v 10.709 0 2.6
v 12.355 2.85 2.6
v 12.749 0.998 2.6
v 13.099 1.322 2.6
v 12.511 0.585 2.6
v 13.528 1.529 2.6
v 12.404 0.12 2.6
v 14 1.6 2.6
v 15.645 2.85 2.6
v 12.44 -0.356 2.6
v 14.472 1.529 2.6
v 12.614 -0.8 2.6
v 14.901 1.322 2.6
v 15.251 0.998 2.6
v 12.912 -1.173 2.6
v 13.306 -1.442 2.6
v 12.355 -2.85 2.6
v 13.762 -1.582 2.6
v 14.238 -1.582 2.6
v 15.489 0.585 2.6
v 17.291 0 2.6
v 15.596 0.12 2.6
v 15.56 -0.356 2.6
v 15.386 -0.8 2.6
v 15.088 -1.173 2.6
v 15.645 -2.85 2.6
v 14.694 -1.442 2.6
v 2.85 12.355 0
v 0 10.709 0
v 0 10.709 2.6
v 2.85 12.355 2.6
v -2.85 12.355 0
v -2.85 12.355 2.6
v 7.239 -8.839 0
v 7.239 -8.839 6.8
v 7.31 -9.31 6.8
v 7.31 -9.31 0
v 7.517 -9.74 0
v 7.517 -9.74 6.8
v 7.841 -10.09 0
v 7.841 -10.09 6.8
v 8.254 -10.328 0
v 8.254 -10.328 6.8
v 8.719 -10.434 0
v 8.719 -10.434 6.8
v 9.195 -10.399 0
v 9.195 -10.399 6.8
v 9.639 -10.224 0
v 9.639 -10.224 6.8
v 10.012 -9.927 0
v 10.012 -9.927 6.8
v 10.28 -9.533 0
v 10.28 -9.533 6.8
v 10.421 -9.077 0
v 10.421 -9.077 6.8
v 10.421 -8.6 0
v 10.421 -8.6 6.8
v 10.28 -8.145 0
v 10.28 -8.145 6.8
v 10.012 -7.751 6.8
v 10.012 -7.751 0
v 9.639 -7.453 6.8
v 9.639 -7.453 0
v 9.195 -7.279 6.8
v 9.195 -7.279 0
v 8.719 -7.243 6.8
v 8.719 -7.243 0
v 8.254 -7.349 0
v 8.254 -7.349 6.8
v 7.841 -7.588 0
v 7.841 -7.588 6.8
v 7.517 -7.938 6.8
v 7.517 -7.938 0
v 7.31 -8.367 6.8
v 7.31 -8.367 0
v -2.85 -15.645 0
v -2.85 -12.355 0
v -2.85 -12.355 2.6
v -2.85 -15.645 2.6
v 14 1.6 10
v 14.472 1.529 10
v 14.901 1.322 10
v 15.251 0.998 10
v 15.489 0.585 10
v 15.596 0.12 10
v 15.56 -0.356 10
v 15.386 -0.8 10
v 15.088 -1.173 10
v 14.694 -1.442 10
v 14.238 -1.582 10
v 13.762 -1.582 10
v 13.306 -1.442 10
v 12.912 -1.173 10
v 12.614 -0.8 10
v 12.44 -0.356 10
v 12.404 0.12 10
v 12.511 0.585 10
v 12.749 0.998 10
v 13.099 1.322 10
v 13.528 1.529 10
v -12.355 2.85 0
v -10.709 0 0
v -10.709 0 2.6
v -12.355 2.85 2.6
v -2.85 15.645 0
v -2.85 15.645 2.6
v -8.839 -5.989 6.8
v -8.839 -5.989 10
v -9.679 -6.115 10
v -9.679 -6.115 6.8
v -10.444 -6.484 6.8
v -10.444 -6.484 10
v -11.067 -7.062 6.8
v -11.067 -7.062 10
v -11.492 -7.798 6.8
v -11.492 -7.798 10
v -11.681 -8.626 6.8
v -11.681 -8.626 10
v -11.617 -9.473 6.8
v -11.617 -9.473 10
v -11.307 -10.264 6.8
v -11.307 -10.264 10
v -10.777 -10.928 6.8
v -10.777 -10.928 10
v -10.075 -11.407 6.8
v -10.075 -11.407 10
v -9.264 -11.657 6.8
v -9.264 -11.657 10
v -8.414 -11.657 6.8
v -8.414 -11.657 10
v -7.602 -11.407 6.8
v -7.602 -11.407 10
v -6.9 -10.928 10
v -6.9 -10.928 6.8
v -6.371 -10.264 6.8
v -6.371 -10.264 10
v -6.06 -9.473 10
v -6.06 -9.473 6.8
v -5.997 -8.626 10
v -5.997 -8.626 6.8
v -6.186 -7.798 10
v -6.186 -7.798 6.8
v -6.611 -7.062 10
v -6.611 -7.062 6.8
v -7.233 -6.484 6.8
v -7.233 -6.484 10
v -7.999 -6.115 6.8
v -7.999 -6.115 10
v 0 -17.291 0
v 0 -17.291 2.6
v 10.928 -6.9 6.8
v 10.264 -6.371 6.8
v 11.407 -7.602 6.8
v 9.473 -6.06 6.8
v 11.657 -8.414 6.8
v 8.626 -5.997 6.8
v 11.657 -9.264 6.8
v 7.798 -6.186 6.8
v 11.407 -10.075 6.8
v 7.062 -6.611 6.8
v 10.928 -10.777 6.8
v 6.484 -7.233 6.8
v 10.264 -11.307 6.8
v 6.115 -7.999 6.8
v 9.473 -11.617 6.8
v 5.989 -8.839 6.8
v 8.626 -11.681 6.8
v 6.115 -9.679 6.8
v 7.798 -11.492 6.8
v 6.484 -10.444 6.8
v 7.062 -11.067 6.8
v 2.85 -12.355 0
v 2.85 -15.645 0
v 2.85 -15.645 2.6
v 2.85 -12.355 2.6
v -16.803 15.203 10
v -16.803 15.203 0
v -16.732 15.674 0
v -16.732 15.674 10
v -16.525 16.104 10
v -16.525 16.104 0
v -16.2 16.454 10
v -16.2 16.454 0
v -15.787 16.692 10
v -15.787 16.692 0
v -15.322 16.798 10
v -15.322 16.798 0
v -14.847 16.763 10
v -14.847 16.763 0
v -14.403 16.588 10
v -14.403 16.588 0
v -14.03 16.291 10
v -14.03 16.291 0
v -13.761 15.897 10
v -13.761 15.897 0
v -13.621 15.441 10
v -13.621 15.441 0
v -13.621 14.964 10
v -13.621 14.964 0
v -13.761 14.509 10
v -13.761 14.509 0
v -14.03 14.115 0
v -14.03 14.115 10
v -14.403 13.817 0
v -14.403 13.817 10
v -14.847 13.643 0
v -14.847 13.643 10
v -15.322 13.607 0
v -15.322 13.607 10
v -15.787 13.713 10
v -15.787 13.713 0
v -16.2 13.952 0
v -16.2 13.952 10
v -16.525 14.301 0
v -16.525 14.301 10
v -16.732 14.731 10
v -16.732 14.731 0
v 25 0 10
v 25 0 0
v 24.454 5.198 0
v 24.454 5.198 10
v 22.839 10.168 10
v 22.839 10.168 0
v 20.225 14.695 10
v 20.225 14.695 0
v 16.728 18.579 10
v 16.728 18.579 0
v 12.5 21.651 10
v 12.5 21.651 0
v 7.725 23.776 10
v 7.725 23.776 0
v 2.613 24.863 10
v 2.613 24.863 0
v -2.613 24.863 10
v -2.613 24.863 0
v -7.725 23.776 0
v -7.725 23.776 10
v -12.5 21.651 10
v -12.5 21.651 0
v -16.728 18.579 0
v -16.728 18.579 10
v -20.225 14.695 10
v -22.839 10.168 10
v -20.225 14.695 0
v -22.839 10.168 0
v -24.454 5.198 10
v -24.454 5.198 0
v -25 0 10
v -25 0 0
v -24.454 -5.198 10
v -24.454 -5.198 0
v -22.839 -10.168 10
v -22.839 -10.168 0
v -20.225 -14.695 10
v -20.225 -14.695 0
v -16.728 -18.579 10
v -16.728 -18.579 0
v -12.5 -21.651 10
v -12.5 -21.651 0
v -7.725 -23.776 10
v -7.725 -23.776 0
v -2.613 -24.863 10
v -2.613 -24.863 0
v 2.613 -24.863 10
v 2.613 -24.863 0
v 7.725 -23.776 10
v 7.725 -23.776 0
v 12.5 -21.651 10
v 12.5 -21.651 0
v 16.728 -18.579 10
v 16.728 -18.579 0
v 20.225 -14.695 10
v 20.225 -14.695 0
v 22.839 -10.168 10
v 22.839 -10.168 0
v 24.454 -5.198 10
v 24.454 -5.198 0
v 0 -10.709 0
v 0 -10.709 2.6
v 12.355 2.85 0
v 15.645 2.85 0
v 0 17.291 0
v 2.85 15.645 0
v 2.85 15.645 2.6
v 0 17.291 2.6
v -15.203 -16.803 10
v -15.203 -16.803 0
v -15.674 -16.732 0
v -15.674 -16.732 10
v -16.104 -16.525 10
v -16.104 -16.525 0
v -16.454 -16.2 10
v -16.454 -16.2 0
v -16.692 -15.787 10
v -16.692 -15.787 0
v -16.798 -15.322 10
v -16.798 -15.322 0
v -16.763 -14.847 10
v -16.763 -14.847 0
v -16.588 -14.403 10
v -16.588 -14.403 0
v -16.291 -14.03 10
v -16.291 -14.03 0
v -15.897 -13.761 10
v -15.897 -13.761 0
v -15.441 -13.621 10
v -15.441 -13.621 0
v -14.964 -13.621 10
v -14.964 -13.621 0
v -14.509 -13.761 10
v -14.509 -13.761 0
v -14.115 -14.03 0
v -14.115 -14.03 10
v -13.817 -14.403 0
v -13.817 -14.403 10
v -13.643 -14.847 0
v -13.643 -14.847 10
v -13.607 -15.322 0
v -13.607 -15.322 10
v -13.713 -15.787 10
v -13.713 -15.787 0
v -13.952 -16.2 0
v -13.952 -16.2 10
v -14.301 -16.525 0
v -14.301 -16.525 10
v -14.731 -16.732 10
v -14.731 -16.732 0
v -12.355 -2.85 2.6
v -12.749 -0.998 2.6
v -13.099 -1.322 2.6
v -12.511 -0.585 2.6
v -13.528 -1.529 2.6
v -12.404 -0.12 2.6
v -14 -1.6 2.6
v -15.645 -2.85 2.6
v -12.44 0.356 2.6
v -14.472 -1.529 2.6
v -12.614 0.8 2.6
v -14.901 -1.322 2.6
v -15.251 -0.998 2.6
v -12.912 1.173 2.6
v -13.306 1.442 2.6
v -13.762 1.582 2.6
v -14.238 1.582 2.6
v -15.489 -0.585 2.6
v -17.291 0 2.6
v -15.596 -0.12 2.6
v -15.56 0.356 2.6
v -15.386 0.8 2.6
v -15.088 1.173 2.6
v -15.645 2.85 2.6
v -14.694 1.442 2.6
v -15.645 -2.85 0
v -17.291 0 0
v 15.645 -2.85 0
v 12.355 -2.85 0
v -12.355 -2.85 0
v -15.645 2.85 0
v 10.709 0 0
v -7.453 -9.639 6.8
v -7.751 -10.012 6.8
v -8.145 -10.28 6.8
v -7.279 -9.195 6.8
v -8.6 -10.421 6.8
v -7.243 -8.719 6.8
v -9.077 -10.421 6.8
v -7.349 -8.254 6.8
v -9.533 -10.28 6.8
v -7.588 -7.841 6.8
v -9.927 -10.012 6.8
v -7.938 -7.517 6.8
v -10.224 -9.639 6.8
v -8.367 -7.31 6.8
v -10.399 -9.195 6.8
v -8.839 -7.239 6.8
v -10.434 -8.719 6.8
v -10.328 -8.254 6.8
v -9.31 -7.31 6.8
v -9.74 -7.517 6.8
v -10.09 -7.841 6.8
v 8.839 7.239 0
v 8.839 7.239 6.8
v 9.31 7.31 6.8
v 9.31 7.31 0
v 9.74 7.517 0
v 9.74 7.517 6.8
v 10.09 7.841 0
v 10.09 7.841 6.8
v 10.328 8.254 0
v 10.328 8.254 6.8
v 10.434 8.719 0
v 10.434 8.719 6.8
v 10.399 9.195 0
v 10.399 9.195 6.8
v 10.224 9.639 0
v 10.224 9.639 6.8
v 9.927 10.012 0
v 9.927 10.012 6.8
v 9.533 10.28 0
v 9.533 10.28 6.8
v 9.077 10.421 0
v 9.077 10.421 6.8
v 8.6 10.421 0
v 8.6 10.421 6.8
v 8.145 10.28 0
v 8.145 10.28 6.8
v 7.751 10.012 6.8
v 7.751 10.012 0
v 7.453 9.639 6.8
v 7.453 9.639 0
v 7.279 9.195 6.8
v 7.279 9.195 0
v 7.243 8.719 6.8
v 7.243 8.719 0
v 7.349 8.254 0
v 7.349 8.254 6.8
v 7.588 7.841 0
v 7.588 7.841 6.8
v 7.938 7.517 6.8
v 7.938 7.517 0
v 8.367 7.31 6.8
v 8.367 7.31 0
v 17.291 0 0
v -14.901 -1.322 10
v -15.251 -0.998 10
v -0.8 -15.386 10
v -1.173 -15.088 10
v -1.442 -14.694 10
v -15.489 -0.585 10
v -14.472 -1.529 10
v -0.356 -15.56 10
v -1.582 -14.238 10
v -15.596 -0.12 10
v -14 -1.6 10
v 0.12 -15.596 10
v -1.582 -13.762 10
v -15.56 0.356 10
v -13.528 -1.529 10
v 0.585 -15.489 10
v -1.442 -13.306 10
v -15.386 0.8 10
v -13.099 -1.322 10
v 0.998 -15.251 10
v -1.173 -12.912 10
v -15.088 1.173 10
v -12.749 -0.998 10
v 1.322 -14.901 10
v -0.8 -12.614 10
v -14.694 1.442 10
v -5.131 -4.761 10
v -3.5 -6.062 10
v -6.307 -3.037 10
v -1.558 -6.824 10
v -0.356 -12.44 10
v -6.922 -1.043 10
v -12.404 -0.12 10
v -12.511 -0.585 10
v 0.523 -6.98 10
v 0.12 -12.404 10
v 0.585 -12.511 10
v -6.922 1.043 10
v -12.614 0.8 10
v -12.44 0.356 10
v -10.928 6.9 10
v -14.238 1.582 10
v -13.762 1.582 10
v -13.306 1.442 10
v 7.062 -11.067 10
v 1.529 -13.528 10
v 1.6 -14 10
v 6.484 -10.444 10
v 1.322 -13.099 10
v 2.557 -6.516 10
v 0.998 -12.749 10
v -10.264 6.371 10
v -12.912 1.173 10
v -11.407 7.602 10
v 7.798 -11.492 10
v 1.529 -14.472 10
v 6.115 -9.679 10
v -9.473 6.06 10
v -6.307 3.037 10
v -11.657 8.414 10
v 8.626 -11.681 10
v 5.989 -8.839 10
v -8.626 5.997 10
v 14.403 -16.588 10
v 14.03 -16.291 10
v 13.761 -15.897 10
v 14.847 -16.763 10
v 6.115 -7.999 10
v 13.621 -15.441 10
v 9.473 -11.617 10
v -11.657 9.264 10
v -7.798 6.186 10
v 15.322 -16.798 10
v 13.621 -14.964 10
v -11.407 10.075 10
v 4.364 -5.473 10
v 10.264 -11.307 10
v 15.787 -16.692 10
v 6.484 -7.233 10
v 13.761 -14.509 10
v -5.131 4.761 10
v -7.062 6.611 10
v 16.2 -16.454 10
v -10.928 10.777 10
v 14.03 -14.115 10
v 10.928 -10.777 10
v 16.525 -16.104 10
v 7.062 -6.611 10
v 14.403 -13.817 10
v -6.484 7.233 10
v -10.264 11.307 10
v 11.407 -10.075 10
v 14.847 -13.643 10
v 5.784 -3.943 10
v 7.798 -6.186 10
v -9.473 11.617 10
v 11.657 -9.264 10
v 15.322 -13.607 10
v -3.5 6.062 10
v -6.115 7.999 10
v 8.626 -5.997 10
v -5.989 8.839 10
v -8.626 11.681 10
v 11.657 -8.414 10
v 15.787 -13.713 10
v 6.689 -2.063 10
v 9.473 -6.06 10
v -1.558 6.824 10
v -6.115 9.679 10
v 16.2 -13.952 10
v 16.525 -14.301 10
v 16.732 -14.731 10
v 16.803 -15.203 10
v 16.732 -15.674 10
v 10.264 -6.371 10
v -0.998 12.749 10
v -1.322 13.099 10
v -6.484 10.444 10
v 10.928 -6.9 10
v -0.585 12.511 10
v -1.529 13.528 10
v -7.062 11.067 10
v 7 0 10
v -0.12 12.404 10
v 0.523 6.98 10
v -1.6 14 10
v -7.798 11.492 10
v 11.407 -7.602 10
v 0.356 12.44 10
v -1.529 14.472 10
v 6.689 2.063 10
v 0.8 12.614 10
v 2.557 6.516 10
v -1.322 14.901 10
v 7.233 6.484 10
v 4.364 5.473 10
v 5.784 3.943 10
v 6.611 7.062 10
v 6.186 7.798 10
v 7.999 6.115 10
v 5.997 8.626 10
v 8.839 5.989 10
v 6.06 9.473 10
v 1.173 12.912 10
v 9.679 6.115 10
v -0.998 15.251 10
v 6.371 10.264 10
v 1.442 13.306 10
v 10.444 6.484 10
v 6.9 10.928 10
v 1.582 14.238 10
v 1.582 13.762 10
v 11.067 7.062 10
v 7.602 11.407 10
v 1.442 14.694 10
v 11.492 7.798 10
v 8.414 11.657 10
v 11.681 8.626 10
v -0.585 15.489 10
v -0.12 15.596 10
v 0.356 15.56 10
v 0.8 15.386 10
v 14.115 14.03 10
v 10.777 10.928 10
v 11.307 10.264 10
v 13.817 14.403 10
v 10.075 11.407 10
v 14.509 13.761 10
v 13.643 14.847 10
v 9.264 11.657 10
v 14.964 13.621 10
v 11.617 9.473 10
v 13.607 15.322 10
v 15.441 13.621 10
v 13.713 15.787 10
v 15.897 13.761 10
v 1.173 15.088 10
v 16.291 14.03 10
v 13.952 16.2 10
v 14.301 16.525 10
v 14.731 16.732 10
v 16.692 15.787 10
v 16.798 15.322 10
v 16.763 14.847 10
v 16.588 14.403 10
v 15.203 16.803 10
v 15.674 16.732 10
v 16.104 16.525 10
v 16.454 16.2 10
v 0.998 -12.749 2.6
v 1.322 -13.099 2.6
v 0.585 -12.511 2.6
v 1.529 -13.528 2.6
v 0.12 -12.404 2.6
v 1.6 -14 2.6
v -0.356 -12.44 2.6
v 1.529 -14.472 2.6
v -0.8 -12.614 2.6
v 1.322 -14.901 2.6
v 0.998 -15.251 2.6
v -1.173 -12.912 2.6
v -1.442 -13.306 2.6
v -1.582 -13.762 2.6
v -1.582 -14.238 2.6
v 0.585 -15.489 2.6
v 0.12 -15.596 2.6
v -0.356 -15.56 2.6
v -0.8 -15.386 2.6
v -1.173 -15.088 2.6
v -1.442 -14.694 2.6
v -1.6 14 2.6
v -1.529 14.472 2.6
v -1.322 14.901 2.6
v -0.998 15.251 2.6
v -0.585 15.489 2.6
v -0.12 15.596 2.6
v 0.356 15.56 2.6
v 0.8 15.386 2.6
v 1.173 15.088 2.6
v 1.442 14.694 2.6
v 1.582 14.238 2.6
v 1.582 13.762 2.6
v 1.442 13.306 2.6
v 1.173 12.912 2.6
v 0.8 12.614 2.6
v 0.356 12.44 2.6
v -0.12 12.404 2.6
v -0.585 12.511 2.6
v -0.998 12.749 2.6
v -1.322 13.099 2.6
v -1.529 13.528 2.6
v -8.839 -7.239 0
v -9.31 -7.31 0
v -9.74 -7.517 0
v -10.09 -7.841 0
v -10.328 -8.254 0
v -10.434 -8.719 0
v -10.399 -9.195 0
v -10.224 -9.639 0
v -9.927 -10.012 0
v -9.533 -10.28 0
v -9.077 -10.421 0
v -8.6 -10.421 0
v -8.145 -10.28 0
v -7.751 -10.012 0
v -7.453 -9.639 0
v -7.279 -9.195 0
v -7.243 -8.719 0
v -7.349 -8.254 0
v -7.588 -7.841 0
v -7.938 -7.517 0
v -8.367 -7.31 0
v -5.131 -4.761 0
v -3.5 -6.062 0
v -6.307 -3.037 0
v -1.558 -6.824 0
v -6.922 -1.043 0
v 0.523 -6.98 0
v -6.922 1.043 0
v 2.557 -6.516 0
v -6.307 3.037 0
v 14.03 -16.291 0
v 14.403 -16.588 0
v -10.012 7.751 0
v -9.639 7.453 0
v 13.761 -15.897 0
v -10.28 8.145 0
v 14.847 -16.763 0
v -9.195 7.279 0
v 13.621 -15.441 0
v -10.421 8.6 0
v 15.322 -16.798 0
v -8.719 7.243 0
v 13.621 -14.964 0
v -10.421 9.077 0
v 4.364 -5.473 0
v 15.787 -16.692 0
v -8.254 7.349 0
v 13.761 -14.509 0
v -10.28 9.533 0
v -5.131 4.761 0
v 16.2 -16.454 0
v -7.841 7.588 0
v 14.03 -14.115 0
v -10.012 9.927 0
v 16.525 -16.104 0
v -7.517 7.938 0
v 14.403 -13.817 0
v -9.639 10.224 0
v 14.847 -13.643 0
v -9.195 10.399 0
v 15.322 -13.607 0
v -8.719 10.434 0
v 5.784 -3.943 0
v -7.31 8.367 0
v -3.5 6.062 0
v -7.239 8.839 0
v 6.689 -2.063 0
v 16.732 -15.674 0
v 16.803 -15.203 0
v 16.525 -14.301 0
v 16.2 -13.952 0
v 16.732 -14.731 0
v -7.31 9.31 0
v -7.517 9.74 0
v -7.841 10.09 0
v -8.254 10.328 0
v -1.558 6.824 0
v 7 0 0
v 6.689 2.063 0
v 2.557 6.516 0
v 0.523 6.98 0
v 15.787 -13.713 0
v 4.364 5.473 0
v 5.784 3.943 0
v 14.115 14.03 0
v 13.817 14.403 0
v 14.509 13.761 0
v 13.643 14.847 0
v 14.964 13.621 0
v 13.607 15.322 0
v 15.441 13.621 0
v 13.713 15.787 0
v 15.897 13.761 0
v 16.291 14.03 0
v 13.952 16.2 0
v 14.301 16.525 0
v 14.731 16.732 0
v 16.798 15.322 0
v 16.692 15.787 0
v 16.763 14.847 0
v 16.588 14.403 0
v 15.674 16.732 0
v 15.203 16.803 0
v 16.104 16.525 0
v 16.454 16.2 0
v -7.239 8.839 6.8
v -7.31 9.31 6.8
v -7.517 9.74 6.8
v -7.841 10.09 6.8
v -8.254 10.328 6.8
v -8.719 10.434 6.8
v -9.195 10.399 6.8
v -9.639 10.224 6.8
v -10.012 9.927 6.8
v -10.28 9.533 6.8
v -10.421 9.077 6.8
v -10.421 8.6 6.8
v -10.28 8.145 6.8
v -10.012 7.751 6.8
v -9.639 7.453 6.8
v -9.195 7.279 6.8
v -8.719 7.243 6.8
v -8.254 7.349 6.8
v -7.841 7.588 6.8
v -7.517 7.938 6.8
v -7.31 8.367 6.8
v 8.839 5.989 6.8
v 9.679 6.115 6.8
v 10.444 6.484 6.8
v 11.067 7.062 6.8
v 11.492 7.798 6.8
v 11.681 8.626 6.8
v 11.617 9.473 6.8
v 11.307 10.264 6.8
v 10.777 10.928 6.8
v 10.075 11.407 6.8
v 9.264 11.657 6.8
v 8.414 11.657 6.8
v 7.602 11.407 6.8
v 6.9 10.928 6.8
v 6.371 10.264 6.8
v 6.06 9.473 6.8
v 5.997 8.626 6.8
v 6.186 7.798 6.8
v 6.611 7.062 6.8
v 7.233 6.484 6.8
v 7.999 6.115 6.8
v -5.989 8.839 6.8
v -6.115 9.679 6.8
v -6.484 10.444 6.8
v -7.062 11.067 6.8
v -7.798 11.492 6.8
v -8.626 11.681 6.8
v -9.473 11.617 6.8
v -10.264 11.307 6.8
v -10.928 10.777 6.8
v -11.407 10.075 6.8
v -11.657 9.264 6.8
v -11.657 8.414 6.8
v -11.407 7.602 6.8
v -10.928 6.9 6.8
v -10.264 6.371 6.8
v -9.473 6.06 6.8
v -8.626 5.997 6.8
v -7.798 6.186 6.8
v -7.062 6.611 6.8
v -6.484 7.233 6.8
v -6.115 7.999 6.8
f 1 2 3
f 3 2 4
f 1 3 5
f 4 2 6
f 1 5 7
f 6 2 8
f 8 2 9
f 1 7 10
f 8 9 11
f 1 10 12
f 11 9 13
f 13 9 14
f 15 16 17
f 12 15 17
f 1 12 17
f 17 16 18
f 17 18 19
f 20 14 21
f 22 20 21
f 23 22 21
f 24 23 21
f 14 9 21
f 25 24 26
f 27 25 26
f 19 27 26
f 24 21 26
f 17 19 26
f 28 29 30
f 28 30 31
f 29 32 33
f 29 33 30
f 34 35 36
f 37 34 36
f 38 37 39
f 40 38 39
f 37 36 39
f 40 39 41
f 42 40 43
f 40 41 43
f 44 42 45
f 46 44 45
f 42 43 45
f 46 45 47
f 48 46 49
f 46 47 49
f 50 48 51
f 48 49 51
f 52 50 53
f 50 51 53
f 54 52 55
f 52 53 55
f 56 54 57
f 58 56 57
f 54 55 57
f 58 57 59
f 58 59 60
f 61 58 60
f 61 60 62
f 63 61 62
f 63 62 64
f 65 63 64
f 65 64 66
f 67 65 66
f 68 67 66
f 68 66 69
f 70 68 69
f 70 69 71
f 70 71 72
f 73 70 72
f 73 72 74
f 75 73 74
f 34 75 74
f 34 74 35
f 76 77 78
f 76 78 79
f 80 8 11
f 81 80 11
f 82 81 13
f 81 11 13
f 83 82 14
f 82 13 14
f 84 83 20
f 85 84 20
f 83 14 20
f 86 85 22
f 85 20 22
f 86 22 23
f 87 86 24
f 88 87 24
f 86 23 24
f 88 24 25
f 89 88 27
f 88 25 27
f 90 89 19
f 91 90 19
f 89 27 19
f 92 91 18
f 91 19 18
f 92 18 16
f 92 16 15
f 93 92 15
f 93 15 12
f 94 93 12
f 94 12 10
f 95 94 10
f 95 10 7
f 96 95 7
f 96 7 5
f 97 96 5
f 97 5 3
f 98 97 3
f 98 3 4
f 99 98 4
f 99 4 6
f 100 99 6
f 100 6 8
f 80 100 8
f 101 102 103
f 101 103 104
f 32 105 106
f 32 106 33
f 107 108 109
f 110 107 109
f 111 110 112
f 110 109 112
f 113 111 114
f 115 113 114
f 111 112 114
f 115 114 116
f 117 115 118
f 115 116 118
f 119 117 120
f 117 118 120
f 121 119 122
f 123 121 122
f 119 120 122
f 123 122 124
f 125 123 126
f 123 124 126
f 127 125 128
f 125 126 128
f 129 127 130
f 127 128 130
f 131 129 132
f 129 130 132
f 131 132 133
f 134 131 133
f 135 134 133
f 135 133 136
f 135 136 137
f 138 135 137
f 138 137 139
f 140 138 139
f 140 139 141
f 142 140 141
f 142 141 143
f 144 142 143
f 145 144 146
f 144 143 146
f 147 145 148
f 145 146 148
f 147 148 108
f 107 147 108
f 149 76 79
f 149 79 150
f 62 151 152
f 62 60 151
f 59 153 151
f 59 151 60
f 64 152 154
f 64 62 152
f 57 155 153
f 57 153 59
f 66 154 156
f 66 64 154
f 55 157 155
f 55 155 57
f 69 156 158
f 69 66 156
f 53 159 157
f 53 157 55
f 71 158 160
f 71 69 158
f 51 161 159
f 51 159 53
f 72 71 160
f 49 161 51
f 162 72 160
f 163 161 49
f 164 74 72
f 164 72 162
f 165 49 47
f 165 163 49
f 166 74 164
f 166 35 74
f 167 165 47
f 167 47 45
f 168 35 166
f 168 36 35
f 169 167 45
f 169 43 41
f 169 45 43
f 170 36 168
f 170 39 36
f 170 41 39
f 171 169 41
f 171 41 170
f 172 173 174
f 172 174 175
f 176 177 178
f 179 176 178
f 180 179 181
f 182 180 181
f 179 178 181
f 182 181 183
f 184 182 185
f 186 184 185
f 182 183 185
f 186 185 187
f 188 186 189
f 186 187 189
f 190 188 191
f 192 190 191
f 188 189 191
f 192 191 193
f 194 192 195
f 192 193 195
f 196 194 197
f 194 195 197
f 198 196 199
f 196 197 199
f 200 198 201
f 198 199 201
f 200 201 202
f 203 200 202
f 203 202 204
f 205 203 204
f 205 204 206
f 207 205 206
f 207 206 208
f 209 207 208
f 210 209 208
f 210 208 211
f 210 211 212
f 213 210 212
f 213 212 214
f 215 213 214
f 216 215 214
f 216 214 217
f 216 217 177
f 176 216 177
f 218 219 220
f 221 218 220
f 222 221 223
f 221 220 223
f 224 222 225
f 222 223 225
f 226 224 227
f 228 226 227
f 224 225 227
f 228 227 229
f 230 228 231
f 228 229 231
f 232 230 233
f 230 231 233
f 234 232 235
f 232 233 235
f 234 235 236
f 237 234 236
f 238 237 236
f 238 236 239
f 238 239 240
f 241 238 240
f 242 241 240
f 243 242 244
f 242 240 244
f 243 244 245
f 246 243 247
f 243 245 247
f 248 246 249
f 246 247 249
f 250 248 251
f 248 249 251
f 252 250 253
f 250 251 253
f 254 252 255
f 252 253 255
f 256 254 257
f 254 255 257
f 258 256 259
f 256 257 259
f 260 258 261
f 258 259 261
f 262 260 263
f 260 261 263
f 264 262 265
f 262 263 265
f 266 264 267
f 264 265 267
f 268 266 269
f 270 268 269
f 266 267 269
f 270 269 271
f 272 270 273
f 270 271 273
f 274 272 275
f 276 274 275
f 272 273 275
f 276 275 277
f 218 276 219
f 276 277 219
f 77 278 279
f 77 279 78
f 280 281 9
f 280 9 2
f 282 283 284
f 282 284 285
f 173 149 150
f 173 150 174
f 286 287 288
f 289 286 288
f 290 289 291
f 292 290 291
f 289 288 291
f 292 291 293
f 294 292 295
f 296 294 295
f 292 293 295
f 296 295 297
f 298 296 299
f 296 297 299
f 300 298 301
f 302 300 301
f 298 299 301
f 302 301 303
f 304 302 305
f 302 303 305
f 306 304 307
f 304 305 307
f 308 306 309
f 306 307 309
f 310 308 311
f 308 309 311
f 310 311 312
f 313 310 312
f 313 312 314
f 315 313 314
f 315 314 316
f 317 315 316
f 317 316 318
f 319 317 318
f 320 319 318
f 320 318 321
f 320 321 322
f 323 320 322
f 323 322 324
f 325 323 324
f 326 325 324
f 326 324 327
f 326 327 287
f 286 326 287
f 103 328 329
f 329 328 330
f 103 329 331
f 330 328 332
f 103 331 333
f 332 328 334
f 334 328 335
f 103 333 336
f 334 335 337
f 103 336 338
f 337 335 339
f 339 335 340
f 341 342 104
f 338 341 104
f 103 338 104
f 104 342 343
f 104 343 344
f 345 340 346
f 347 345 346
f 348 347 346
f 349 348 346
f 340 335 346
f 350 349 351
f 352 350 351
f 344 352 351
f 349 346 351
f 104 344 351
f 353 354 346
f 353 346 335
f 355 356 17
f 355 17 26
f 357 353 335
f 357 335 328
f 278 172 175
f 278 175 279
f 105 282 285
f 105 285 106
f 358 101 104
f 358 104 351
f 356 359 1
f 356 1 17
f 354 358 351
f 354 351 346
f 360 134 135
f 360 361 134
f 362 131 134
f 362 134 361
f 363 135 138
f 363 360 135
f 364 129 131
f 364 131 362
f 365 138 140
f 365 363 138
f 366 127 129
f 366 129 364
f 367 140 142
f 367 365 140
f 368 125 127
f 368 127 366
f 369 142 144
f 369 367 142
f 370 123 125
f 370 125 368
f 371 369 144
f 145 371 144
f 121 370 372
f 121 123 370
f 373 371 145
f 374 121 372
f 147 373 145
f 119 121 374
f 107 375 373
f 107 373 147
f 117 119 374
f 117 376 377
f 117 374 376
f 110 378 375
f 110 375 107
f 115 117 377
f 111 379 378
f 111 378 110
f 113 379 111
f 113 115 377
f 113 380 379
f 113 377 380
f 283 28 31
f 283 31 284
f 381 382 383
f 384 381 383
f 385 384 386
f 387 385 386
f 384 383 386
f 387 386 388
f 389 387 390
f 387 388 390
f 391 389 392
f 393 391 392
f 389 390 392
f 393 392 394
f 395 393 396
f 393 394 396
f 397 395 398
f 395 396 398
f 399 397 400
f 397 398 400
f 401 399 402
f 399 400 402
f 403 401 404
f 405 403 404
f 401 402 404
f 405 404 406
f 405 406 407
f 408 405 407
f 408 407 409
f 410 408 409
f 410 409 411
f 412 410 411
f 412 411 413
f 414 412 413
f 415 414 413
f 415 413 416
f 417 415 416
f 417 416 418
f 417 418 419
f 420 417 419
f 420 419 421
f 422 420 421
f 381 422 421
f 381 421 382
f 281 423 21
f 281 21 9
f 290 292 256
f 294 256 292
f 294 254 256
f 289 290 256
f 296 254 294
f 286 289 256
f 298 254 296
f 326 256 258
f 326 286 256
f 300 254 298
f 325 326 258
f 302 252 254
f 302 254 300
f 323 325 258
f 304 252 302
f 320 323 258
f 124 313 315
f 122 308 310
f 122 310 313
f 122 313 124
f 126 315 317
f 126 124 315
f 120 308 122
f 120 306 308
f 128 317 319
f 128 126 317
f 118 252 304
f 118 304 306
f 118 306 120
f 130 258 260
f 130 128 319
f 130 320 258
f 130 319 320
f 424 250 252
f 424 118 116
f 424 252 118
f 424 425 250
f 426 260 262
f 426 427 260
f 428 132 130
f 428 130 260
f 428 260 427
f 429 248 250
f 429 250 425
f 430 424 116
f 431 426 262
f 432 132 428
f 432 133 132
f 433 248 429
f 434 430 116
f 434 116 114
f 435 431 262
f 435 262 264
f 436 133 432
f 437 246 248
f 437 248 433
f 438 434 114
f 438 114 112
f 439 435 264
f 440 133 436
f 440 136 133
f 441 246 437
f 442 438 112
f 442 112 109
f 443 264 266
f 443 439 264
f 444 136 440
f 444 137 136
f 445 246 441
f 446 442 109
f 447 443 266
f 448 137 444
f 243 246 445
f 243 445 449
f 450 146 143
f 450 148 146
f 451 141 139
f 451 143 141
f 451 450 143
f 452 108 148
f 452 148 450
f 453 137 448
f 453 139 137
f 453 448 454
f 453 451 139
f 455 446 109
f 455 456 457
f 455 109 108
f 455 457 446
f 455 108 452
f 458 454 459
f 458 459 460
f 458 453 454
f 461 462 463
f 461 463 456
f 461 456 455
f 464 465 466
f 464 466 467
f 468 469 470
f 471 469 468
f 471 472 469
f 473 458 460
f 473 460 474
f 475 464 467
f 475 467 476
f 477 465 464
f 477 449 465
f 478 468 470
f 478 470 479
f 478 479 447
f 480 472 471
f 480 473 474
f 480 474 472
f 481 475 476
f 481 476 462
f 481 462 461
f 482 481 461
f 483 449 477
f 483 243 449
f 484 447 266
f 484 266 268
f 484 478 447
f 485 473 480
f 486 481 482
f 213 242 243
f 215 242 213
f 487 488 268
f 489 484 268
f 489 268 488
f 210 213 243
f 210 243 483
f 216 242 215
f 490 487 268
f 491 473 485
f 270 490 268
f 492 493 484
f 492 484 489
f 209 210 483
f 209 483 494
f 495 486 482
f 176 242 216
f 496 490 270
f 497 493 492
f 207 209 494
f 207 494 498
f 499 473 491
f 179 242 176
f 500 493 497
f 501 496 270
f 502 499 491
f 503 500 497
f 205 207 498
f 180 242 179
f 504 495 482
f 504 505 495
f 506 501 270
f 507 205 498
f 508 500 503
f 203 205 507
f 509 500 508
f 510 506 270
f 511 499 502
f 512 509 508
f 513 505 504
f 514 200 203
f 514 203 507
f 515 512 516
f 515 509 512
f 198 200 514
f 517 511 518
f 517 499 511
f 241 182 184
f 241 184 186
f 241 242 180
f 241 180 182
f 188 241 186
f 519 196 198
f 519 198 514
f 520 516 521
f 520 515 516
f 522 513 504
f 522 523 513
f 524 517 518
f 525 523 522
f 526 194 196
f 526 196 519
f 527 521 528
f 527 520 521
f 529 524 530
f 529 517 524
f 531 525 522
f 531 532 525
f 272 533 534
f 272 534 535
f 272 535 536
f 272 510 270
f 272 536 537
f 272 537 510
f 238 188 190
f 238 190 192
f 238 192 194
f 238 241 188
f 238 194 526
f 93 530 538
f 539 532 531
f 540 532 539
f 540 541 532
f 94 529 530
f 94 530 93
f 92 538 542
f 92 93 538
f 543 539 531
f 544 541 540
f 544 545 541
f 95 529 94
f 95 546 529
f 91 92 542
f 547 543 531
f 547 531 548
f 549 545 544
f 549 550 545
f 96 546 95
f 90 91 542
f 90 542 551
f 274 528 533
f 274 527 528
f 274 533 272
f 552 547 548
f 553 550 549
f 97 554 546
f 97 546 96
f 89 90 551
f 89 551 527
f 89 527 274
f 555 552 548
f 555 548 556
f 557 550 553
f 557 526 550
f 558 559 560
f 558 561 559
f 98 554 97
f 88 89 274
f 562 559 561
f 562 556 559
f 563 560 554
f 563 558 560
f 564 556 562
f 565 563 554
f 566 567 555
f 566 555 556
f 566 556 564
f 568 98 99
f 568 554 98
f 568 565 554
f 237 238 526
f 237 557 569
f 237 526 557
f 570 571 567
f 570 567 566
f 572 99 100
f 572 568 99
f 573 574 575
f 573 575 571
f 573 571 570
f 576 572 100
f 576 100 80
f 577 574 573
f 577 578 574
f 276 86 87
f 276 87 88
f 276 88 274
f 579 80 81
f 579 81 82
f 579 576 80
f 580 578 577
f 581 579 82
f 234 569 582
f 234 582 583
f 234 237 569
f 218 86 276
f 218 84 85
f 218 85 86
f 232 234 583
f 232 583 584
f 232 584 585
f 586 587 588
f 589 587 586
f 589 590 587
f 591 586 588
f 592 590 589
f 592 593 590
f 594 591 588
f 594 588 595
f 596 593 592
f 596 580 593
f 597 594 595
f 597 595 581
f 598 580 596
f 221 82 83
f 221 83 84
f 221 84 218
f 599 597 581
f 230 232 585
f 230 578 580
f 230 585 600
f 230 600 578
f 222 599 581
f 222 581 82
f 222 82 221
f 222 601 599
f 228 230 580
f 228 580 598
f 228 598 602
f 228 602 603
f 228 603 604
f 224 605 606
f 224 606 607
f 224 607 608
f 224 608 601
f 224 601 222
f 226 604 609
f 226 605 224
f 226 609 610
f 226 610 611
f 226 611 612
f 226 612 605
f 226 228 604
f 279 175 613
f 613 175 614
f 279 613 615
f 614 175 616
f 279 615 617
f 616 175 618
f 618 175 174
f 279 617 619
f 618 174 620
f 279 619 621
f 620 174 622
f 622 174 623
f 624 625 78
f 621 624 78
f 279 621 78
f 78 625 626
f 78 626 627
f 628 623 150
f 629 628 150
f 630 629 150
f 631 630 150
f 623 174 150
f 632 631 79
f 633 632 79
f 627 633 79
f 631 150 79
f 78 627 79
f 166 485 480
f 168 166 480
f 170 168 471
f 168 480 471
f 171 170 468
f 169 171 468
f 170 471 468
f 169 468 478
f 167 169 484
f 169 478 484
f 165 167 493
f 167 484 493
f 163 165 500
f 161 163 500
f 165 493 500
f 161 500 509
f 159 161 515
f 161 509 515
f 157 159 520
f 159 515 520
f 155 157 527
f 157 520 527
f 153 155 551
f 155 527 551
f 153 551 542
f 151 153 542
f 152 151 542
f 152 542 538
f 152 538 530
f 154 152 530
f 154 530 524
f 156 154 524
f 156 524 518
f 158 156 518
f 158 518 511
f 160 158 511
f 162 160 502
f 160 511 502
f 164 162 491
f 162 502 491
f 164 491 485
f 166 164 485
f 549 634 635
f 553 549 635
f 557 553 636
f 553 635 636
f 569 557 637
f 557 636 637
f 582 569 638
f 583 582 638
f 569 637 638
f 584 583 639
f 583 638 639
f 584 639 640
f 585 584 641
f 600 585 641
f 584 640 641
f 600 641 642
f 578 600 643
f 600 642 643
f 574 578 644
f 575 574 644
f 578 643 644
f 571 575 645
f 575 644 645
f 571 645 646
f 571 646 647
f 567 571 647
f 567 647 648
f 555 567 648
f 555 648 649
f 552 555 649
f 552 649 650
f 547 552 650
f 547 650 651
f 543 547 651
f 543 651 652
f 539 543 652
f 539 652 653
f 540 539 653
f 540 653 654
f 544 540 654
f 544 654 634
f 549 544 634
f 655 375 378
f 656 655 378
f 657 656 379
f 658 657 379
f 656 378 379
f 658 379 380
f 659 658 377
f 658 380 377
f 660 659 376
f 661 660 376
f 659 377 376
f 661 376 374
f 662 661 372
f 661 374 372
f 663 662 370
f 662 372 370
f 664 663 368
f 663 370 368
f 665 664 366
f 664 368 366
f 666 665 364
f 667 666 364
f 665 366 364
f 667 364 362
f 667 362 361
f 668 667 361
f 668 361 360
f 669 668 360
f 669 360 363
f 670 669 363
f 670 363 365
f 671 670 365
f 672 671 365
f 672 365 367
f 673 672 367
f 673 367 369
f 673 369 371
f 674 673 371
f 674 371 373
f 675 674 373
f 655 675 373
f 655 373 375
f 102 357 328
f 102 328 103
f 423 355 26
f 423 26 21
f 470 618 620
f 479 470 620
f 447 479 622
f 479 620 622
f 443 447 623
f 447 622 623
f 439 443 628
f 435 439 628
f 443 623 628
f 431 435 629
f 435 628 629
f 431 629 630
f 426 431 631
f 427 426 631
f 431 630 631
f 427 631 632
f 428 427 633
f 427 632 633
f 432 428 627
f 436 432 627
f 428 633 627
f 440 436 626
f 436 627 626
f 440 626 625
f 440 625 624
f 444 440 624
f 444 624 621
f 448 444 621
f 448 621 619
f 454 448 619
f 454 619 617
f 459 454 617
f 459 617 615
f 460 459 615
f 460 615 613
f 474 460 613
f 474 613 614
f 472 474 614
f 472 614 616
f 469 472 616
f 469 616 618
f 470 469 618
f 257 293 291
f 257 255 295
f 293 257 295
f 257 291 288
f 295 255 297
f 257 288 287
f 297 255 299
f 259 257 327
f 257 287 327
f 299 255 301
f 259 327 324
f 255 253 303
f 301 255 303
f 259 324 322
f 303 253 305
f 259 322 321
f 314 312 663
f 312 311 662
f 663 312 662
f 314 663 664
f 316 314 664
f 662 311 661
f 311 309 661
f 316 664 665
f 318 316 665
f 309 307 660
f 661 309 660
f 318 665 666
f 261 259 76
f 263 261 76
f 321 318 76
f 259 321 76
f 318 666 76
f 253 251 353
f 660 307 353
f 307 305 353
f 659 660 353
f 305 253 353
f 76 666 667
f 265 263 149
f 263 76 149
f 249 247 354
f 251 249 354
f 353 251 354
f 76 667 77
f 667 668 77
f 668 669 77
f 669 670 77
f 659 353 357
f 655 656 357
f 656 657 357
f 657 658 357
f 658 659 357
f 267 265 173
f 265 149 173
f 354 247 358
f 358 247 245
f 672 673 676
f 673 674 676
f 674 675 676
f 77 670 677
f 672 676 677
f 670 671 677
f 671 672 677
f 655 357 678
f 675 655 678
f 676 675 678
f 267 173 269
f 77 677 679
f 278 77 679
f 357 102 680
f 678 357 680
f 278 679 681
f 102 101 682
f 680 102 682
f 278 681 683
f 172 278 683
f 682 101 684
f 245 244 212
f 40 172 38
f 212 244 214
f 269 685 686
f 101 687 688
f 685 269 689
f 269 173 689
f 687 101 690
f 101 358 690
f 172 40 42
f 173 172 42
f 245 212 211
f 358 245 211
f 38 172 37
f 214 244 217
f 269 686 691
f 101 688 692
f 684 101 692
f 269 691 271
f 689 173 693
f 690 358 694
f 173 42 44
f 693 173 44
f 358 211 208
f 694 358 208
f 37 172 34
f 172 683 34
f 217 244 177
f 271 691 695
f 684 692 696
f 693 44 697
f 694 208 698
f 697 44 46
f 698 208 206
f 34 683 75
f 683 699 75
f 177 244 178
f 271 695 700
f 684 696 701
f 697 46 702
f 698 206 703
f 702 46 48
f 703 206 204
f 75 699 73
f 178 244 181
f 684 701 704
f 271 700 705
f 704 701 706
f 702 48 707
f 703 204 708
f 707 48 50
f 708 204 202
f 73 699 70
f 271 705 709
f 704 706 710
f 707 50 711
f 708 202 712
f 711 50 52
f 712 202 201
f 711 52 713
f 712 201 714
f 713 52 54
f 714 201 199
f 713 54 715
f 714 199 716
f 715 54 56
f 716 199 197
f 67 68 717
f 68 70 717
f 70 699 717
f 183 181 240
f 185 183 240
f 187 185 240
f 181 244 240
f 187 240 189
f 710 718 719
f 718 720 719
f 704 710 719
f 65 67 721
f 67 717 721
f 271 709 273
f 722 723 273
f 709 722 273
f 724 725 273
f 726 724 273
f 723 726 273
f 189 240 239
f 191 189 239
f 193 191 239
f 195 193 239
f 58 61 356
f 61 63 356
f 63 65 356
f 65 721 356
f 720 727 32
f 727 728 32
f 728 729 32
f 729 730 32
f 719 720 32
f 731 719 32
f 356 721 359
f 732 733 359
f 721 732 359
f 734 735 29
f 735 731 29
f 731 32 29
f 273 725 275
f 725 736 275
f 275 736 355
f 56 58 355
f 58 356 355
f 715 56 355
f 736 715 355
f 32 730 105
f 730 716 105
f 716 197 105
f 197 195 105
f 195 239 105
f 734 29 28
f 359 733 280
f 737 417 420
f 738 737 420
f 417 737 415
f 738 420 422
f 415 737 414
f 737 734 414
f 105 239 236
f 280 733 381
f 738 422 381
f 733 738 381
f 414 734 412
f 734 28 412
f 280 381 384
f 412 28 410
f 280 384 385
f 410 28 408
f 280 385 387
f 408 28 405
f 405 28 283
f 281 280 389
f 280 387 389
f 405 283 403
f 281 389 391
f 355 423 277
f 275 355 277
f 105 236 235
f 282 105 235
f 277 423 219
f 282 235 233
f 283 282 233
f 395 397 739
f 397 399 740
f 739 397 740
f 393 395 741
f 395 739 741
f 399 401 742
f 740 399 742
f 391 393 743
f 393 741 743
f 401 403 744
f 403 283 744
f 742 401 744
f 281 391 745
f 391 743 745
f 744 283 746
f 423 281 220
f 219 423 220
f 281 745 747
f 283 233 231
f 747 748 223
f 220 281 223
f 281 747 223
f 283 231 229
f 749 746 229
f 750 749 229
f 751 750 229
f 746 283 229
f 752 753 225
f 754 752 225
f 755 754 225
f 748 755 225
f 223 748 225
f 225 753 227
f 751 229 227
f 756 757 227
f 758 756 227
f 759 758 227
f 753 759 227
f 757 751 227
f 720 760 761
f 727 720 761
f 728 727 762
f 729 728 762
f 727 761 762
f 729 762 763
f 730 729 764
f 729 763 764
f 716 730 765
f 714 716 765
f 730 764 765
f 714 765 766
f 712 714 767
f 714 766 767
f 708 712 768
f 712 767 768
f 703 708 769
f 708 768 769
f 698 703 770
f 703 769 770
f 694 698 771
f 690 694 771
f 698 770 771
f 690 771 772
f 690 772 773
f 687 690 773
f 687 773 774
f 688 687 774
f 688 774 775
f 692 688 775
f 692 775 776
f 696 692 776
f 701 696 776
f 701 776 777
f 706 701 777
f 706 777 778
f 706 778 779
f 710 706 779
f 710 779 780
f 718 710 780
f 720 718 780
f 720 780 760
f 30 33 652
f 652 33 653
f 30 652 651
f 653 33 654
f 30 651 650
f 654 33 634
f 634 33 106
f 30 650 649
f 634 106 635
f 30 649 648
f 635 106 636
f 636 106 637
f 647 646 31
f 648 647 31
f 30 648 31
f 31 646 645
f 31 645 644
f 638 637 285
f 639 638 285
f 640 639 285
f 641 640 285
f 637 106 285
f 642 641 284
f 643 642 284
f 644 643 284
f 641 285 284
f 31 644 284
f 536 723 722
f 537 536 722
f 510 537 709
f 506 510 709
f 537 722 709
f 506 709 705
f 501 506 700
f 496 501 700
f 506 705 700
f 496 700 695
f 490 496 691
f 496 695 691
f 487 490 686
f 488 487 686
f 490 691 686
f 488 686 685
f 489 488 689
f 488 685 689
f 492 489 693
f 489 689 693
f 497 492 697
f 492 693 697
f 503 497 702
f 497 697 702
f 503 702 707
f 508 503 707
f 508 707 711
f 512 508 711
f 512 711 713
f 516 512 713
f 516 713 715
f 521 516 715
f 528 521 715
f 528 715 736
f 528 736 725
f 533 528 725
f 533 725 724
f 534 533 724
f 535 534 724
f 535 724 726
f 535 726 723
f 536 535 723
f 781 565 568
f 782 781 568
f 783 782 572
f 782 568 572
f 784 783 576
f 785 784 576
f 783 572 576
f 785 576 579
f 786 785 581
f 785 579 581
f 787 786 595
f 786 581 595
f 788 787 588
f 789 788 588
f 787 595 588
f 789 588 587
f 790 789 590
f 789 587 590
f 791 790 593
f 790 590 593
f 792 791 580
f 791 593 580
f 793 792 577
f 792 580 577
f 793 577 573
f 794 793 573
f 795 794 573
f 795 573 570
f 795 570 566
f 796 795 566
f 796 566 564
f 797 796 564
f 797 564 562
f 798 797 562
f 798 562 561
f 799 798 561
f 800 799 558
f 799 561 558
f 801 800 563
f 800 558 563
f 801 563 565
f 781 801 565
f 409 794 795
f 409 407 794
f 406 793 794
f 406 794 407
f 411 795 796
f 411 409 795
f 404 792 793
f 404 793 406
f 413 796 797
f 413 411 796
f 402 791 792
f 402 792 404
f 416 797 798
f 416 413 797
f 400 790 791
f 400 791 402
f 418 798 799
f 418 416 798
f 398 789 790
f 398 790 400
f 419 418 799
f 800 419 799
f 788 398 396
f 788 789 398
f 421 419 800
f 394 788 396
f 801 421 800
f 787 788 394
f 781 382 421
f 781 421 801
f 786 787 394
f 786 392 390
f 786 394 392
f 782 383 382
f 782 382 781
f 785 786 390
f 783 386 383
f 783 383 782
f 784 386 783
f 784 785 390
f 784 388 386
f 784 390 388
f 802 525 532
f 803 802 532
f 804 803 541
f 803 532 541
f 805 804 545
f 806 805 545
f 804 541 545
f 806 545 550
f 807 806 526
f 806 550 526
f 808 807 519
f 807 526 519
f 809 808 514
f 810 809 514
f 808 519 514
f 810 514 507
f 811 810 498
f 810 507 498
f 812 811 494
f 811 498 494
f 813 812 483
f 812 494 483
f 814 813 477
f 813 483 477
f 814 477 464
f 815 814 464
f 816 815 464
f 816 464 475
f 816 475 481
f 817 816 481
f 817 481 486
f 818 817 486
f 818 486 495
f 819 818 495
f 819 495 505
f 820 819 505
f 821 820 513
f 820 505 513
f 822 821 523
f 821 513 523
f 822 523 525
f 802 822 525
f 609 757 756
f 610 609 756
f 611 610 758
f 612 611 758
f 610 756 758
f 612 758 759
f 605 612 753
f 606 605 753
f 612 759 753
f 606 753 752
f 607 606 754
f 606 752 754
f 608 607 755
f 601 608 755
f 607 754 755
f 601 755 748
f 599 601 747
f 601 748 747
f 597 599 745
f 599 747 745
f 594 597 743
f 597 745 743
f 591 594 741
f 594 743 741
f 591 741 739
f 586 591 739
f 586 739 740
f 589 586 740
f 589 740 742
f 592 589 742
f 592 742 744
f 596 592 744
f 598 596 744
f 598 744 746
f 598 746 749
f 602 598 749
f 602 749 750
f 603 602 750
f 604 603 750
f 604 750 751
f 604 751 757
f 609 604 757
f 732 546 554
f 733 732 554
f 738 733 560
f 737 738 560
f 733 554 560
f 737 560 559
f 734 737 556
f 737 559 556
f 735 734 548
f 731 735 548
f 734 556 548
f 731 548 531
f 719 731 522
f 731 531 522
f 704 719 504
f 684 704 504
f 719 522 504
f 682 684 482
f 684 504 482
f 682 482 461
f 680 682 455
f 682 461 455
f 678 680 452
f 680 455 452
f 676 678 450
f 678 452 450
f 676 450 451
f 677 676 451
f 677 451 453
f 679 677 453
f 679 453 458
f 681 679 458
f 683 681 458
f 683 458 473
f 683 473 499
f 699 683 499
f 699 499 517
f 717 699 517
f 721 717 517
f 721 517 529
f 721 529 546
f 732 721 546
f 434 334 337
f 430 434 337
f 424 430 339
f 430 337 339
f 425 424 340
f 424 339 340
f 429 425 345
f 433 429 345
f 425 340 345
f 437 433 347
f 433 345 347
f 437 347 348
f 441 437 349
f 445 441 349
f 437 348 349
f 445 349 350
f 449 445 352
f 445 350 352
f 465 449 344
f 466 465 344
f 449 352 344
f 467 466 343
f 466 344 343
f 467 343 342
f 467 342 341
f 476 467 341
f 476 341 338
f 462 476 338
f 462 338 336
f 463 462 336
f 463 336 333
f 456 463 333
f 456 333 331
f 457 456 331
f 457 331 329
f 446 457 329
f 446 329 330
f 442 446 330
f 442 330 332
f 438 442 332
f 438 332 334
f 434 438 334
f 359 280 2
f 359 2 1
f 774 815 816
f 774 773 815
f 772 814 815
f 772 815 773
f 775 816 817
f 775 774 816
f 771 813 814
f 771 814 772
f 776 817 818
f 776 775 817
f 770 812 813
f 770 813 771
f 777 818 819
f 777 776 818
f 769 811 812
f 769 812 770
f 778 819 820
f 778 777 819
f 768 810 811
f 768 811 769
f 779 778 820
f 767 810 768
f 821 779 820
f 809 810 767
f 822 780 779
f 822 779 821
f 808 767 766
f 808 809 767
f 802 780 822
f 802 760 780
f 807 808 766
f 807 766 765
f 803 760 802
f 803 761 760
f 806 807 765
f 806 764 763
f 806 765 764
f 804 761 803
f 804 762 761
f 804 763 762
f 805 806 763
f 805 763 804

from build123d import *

# Parameters (mm, degrees)
SKETCH1_R           = 25
BOSS_EXTRUDE1_DEPTH = 10
SKETCH2_R           = 1.6
CUT_EXTRUDE1_DEPTH  = 37.742346142
SKETCH5_R           = 2.85
CUT_EXTRUDE4_DEPTH  = 3.2
CIRPATTERN1_COUNT   = 4
SKETCH8_R           = 1.6
CUT_EXTRUDE6_DEPTH  = 37.742346142
CUT_EXTRUDE2_DEPTH  = 2.6
CIRPATTERN2_COUNT   = 4
SKETCH4_R           = 7
CUT_EXTRUDE3_DEPTH  = 37.742346142
SKETCH6_R           = 1.6
CUT_EXTRUDE5_DEPTH  = 37.742346142
CIRPATTERN3_COUNT   = 4


with BuildPart() as part:
    # Sketch1 → Boss-Extrude1 (new body)
    with BuildSketch(Plane.XY):
        Circle(SKETCH1_R)
    extrude(amount=BOSS_EXTRUDE1_DEPTH)

    # Sketch2 → Cut-Extrude1 (cut, through all)
    with BuildSketch(Plane.XY.offset(10)):
        with Locations((-8.838834765, 8.838834765)):
            Circle(SKETCH2_R)
    cut_extrude1 = extrude(amount=-CUT_EXTRUDE1_DEPTH, mode=Mode.SUBTRACT)

    # Sketch5 → Cut-Extrude4 (cut)
    with BuildSketch(Plane.XY.offset(10)):
        with Locations((-8.838834765, 8.838834765)):
            Circle(SKETCH5_R)
    cut_extrude4 = extrude(amount=-CUT_EXTRUDE4_DEPTH, mode=Mode.SUBTRACT)

    # CirPattern1: Cut-Extrude1, Cut-Extrude4 ×4 about axis
    cirpattern1_axis = Axis((0, 0, 0), (0, 0, 1))
    add([cut_extrude1.rotate(cirpattern1_axis, i * 360 / CIRPATTERN1_COUNT) for i in range(1, CIRPATTERN1_COUNT)], mode=Mode.SUBTRACT)
    add([cut_extrude4.rotate(cirpattern1_axis, i * 360 / CIRPATTERN1_COUNT) for i in range(1, CIRPATTERN1_COUNT)], mode=Mode.SUBTRACT)

    # Sketch8 → Cut-Extrude6 (cut, through all)
    with BuildSketch(Plane(origin=(0, 0, 0), x_dir=(-1, 0, 0), z_dir=(0, 0, -1))):
        with Locations((0, 14)):
            Circle(SKETCH8_R)
    cut_extrude6 = extrude(amount=-CUT_EXTRUDE6_DEPTH, mode=Mode.SUBTRACT)

    # Sketch3 → Cut-Extrude2 (cut)
    with BuildSketch(Plane.XY):
        Polygon((2.85, 12.354551733), (2.85, 15.645448267), (0, 17.290896534), (-2.85, 15.645448267), (-2.85, 12.354551733), (0, 10.709103466), align=None)
    cut_extrude2 = extrude(amount=CUT_EXTRUDE2_DEPTH, mode=Mode.SUBTRACT)

    # CirPattern2: Cut-Extrude6, Cut-Extrude2 ×4 about axis
    cirpattern2_axis = Axis((0, 0, 0), (0, 0, 1))
    add([cut_extrude6.rotate(cirpattern2_axis, i * 360 / CIRPATTERN2_COUNT) for i in range(1, CIRPATTERN2_COUNT)], mode=Mode.SUBTRACT)
    add([cut_extrude2.rotate(cirpattern2_axis, i * 360 / CIRPATTERN2_COUNT) for i in range(1, CIRPATTERN2_COUNT)], mode=Mode.SUBTRACT)

    # Sketch4 → Cut-Extrude3 (cut, through all)
    with BuildSketch(Plane.XY.offset(10)):
        Circle(SKETCH4_R)
    extrude(amount=-CUT_EXTRUDE3_DEPTH, mode=Mode.SUBTRACT)

    # Sketch6 → Cut-Extrude5 (cut, through all)
    with BuildSketch(Plane(origin=(0, 0, 0), x_dir=(-1, 0, 0), z_dir=(0, 0, -1))):
        with Locations((15.202795796, 15.202795796)):
            Circle(SKETCH6_R)
    cut_extrude5 = extrude(amount=-CUT_EXTRUDE5_DEPTH, mode=Mode.SUBTRACT)

    # CirPattern3: Cut-Extrude5 ×4 about axis
    cirpattern3_axis = Axis((0, 0, 0), (0, 0, 1))
    for i in range(1, CIRPATTERN3_COUNT):
        add(cut_extrude5.rotate(cirpattern3_axis, i * 360 / CIRPATTERN3_COUNT), mode=Mode.SUBTRACT)


solid = part.part
